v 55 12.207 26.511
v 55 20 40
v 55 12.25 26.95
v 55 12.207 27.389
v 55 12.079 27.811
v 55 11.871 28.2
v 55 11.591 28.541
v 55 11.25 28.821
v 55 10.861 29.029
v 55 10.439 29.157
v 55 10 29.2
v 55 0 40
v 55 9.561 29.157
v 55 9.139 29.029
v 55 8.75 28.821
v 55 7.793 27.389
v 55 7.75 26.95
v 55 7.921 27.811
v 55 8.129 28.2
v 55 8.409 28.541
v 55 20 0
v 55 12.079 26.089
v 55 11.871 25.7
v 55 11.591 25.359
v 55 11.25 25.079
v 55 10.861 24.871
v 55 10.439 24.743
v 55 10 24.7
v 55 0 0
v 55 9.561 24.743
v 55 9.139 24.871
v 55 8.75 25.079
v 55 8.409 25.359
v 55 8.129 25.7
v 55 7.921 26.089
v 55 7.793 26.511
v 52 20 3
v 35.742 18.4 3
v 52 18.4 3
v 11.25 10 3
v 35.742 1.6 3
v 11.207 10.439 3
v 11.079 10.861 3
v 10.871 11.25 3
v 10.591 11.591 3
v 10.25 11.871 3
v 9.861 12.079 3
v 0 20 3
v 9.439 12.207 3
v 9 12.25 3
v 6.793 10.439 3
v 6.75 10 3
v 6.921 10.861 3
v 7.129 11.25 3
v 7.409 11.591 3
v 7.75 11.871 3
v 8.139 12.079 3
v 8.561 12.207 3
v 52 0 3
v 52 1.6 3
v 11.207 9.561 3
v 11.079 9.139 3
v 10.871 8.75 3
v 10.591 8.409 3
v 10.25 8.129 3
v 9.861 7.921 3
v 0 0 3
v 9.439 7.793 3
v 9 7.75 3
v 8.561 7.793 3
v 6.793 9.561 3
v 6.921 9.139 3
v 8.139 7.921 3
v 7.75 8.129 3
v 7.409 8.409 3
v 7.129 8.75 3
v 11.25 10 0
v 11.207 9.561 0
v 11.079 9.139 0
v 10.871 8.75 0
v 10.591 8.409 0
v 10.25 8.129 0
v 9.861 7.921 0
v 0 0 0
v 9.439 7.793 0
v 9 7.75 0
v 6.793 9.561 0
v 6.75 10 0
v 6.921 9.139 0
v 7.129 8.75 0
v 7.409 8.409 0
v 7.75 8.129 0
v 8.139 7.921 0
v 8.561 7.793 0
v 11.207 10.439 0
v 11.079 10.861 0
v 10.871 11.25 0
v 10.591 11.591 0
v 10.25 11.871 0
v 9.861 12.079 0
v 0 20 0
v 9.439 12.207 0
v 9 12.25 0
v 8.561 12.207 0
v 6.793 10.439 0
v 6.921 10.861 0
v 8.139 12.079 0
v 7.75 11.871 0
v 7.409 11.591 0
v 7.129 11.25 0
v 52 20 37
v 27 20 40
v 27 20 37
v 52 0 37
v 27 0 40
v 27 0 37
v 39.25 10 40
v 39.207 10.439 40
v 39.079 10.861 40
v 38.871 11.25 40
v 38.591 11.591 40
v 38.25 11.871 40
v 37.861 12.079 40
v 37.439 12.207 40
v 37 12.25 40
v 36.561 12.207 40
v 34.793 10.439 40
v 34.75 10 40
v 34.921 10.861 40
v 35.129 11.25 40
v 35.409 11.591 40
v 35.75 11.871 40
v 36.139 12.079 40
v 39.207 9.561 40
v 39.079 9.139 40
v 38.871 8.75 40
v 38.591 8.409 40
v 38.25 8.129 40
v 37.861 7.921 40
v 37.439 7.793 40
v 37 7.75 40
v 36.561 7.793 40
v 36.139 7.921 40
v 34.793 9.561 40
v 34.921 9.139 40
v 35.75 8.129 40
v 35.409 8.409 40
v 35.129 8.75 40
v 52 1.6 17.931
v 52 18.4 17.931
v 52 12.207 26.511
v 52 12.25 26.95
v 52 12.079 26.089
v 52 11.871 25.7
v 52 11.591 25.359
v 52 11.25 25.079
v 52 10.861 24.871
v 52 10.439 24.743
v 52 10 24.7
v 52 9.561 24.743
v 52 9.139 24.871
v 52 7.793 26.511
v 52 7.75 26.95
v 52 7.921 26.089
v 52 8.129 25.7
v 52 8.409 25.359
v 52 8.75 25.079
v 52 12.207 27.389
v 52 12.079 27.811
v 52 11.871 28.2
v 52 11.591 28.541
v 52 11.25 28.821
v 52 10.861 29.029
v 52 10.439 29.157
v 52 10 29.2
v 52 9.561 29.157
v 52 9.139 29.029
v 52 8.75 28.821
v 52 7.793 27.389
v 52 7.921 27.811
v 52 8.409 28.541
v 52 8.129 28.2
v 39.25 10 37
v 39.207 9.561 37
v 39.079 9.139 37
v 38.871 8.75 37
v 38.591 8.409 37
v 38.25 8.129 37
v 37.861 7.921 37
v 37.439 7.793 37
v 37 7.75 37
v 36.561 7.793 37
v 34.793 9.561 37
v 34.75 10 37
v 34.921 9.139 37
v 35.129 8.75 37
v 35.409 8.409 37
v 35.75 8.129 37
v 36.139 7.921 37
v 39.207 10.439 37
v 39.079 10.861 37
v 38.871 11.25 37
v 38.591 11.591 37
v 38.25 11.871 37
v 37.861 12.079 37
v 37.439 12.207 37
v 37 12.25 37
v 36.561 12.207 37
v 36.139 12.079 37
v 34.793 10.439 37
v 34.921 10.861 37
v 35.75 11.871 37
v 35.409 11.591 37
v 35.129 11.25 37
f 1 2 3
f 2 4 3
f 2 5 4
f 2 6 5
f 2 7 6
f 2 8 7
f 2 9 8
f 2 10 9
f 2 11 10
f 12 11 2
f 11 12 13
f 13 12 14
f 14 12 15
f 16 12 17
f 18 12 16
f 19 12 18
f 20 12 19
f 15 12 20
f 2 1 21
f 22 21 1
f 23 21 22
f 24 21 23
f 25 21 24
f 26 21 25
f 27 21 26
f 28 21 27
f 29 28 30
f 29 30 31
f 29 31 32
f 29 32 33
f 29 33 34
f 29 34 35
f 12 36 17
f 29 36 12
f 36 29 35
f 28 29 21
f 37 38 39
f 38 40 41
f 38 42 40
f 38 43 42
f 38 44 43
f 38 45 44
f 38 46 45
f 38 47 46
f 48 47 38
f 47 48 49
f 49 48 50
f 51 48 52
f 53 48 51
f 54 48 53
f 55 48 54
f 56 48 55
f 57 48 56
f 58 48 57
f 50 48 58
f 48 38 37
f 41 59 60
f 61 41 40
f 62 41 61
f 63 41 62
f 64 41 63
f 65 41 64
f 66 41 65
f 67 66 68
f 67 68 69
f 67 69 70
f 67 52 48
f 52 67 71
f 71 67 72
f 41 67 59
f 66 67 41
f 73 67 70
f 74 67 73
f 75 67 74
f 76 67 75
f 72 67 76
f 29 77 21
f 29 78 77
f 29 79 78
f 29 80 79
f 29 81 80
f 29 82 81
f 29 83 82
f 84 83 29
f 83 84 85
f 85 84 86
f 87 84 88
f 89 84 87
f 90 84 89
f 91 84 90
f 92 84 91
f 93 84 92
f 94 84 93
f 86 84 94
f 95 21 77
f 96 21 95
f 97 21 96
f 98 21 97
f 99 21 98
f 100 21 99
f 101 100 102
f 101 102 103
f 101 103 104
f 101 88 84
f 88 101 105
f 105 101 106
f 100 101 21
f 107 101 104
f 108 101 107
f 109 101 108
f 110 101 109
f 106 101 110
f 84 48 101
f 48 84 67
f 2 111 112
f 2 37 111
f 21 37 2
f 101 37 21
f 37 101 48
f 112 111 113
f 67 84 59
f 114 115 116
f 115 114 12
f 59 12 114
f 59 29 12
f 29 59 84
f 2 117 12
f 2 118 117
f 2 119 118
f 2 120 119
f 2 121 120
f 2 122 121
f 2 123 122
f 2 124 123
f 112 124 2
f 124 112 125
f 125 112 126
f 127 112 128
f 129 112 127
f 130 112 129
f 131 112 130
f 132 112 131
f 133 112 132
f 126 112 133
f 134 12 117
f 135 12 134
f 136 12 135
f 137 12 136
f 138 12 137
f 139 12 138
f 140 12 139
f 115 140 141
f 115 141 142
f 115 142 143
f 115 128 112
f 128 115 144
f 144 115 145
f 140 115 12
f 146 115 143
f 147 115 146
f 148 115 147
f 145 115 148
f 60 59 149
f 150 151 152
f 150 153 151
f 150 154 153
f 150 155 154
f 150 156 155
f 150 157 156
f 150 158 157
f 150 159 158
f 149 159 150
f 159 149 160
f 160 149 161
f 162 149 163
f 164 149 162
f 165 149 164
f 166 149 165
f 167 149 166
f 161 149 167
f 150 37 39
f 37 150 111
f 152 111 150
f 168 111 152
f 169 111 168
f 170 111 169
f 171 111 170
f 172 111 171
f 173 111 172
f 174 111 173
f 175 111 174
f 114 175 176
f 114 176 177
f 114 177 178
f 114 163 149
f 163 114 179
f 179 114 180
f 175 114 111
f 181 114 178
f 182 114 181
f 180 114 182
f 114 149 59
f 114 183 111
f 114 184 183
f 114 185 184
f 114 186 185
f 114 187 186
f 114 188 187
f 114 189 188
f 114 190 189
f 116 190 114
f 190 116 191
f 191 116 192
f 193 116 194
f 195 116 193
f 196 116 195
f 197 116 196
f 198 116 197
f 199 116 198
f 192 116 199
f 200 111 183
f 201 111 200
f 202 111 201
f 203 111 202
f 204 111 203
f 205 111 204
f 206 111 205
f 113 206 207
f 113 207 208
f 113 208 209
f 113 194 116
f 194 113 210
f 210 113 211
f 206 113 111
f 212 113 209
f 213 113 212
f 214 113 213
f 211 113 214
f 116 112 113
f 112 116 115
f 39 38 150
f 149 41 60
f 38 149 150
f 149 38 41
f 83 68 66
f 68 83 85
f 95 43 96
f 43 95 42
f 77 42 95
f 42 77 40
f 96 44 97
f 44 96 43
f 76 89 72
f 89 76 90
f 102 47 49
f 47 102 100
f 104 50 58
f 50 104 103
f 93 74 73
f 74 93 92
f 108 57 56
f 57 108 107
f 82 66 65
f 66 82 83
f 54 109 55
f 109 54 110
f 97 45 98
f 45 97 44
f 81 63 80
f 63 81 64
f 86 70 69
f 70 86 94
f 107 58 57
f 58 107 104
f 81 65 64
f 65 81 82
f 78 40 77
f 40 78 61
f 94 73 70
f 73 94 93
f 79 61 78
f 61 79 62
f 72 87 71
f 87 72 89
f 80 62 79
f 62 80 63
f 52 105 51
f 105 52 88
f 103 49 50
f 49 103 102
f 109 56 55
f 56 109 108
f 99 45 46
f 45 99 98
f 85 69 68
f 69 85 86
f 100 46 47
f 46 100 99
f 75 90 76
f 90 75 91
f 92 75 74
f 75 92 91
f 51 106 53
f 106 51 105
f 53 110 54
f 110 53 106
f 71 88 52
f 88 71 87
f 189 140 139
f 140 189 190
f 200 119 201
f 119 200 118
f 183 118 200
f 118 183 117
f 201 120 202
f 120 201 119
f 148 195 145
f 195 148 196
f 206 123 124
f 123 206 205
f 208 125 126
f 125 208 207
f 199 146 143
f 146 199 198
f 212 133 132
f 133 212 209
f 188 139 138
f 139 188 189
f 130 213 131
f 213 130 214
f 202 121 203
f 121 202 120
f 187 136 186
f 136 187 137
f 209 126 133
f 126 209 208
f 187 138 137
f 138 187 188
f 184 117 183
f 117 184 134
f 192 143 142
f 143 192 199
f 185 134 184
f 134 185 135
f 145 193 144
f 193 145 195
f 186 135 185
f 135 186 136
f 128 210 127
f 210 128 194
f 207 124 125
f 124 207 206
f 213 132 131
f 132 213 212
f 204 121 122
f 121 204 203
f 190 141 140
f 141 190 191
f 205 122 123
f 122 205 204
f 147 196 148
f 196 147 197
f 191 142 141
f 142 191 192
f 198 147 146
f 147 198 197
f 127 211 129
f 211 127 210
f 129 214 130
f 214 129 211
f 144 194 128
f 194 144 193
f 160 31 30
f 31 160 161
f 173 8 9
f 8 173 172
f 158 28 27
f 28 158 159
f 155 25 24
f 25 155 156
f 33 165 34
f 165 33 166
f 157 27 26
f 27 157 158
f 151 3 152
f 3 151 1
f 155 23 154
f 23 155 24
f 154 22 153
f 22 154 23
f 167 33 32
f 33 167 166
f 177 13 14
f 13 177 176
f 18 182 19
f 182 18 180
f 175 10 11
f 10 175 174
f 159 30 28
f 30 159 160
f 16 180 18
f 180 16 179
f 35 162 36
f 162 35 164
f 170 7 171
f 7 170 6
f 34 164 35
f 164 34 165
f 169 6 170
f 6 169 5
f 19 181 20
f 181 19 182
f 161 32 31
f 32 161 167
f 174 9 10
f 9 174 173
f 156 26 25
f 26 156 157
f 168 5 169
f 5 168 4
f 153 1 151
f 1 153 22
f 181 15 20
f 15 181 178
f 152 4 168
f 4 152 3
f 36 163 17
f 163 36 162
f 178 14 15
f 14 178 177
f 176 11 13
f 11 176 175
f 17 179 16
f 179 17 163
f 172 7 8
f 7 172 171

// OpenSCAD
$fn = 32;

// ----------------------------------------------------------------------
// Z-bracket: 55 x 20 x 40 mm
// ----------------------------------------------------------------------

// --- parameters (mm) ---
foot_len = 55;            // lower foot length, X
top_len = 25;             // upper foot length, X
depth = 20;               // bracket width, Y
step_h = 40;              // overall rise, Z
plate_t = 3;              // plate thickness
hole_d = 4.5;             // clearance for M4
rib_len = 18;             // gusset leg
rib_sink = 1.6;           // gusset overlap into the plates

module hole_z(px, py, z0) {
  translate([px, py, z0 - 2.5]) cylinder(h = plate_t + 5, d = hole_d);
}
module hole_x(py, pz) {
  translate([-2.5, py, pz]) rotate([0, 90, 0]) cylinder(h = plate_t + 5, d = hole_d);
}
module gusset(x0) {
  translate([x0, depth - rib_sink, 0])
    rotate([90, 0, 0])
      linear_extrude(height = depth - 2 * rib_sink)
        polygon(points = [[rib_sink, plate_t - rib_sink],
                          [rib_sink, plate_t - rib_sink + rib_len],
                          [-rib_len, plate_t - rib_sink]]);
}

difference() {
  union() {
    cube([foot_len, depth, plate_t]);
    /* web, overlapping the lower foot */
    translate([foot_len - plate_t, 0, 0]) cube([plate_t, depth, step_h]);
    /* upper foot, sunk into the web */
    translate([foot_len - plate_t - top_len, 0, step_h - plate_t]) cube([top_len + plate_t, depth, plate_t]);
    gusset(foot_len - plate_t);
  }
  hole_z(9, 10, 0);
  translate([foot_len - plate_t - 15, 0, 0]) hole_z(0, 10, step_h - plate_t);
  translate([foot_len - plate_t, 0, 0]) hole_x(10, 26.95);
}
